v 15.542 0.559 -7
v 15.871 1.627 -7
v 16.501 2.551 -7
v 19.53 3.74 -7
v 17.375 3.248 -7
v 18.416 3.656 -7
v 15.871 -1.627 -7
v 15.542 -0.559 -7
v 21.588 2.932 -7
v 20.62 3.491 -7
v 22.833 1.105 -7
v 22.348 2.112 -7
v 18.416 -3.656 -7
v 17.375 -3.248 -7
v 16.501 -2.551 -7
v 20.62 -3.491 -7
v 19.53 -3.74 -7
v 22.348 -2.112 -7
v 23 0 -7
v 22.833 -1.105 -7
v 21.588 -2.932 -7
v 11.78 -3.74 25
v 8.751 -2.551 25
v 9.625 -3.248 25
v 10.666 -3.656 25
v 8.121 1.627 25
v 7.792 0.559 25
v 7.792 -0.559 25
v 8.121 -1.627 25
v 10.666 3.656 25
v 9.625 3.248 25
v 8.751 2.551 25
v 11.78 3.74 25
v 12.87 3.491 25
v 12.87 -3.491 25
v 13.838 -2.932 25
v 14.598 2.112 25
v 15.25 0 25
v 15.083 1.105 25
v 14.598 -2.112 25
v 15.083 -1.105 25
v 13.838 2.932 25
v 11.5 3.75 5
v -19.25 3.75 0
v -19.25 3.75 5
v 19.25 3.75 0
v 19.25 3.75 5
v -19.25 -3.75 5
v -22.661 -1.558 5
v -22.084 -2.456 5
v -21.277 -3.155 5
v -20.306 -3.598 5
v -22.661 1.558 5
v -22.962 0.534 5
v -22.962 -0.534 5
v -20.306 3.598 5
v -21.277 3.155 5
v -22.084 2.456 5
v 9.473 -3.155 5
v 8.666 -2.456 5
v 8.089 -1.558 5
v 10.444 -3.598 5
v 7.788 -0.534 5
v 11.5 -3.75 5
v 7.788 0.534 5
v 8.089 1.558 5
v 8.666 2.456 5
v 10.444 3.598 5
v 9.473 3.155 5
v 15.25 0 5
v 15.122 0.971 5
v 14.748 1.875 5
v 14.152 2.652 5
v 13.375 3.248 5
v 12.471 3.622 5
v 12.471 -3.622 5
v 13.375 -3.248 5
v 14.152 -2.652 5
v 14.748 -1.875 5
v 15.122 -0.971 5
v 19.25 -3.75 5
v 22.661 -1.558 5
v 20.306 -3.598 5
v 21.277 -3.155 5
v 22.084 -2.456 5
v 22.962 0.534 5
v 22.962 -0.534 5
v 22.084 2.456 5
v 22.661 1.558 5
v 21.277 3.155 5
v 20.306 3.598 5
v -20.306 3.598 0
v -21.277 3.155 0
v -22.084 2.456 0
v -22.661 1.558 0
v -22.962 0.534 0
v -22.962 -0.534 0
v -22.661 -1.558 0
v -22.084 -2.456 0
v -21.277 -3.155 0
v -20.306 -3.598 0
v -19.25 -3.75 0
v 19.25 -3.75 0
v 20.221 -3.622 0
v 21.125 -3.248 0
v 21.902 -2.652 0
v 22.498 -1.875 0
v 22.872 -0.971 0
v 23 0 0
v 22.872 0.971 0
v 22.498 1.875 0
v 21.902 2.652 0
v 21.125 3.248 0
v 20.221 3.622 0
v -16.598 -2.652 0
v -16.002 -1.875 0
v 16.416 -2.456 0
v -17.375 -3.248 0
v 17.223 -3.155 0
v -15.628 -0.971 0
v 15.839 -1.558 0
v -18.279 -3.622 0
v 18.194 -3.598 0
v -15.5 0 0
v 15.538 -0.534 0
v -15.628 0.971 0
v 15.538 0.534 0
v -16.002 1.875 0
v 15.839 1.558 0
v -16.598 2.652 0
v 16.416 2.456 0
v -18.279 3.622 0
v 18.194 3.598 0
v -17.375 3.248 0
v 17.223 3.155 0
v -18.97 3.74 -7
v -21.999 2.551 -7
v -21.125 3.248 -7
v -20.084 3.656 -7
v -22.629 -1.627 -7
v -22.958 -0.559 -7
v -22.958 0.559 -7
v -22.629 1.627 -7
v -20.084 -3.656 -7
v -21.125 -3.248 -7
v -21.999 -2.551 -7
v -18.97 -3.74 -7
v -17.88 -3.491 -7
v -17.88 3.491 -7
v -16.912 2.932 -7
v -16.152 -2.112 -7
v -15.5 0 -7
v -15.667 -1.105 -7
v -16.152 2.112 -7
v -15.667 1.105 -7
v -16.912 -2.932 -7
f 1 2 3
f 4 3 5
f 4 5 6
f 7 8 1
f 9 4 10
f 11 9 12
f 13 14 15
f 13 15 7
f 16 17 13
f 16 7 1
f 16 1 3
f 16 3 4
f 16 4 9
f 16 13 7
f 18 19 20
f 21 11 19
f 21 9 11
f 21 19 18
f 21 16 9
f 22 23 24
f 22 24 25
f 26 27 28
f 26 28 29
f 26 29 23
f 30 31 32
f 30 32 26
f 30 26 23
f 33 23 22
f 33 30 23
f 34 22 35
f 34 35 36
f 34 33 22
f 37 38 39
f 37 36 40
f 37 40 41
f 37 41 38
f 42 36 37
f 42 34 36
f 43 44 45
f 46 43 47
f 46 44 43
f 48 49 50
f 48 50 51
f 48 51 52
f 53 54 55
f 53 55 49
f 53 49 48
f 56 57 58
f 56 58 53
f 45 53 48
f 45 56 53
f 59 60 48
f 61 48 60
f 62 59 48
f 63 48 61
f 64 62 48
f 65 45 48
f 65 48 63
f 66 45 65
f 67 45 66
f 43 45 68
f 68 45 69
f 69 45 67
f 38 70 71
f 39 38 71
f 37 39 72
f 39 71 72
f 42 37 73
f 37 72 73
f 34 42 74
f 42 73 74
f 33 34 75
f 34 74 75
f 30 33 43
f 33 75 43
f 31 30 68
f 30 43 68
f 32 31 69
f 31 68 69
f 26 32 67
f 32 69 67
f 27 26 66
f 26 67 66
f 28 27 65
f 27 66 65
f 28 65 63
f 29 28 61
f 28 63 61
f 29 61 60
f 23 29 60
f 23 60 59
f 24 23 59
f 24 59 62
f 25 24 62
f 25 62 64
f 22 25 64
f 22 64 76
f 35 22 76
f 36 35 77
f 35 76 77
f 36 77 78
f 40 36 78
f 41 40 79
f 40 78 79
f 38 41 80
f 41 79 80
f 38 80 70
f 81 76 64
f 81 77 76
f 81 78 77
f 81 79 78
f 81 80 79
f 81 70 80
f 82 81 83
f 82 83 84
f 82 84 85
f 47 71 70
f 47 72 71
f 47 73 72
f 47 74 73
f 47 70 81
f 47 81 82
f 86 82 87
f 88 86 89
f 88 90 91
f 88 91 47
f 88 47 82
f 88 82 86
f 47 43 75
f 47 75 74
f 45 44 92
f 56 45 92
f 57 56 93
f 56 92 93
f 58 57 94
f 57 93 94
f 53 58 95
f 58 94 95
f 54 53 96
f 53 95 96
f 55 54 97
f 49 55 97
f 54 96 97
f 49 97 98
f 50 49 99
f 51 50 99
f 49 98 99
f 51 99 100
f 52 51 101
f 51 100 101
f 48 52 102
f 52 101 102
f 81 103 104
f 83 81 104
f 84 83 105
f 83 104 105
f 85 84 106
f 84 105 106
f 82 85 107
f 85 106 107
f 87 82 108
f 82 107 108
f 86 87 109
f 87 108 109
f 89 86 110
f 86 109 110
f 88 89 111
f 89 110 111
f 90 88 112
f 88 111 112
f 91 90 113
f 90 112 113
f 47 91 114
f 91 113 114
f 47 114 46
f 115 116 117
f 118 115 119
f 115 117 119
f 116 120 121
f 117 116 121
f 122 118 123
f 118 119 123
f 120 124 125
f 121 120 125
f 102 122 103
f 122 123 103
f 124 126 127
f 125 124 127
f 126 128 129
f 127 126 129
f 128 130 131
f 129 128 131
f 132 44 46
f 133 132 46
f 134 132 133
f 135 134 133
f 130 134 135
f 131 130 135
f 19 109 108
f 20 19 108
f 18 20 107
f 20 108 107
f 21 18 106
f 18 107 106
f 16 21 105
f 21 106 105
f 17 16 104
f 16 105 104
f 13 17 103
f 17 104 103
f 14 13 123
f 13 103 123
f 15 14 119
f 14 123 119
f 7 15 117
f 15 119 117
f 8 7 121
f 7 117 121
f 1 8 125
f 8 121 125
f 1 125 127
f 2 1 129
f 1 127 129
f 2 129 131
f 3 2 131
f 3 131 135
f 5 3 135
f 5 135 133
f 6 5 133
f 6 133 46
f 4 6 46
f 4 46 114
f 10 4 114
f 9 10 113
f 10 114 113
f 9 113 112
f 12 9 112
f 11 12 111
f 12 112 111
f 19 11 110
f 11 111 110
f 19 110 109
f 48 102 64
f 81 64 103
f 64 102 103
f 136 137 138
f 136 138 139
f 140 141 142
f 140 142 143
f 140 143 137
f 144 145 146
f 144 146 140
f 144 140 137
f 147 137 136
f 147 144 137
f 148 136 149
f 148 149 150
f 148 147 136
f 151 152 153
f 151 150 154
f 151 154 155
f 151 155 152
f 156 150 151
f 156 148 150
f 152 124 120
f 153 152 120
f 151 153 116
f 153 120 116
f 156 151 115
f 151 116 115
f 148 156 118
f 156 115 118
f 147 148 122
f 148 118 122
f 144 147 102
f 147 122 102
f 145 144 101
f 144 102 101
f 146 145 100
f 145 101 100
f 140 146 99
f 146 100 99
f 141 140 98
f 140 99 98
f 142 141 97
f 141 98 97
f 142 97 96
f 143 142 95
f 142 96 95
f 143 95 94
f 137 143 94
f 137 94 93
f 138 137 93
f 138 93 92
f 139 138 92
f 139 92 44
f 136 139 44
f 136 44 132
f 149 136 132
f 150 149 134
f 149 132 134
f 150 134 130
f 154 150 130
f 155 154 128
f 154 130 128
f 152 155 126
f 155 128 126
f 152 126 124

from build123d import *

# Parameters (mm, degrees)
PAD003_DEPTH = 5
SKETCH003_R  = 3.75
PAD004_DEPTH = 20
SKETCH004_R  = 3.75
PAD005_DEPTH = 7


with BuildPart() as part:
    # Sketch002 → Pad003 (new body)
    with BuildSketch(Plane.XY):
        with BuildLine():
            ThreePointArc((-19.25, 3.75), (-23, 0), (-19.25, -3.75))
            Line((-19.25, -3.75), (19.25, -3.75))
            ThreePointArc((19.25, -3.75), (23, 0), (19.25, 3.75))
            Line((-19.25, 3.75), (19.25, 3.75))
        make_face()
    extrude(amount=PAD003_DEPTH)

    # Sketch003 (on Face6 of Pad003) → Pad004 (join)
    with BuildSketch(Plane.XY.offset(5)):
        with Locations((11.5, 0)):
            Circle(SKETCH003_R)
    extrude(amount=PAD004_DEPTH)

    # Sketch004 (on Face4 of Pad004) → Pad005 (join)
    with BuildSketch(Plane(origin=(0, 0, 0), x_dir=(1, 0, 0), z_dir=(0, 0, -1))):
        with Locations((-19.25, 0)):
            Circle(SKETCH004_R)
        with Locations((19.25, 0)):
            Circle(SKETCH004_R)
    extrude(amount=PAD005_DEPTH)


solid = part.part
